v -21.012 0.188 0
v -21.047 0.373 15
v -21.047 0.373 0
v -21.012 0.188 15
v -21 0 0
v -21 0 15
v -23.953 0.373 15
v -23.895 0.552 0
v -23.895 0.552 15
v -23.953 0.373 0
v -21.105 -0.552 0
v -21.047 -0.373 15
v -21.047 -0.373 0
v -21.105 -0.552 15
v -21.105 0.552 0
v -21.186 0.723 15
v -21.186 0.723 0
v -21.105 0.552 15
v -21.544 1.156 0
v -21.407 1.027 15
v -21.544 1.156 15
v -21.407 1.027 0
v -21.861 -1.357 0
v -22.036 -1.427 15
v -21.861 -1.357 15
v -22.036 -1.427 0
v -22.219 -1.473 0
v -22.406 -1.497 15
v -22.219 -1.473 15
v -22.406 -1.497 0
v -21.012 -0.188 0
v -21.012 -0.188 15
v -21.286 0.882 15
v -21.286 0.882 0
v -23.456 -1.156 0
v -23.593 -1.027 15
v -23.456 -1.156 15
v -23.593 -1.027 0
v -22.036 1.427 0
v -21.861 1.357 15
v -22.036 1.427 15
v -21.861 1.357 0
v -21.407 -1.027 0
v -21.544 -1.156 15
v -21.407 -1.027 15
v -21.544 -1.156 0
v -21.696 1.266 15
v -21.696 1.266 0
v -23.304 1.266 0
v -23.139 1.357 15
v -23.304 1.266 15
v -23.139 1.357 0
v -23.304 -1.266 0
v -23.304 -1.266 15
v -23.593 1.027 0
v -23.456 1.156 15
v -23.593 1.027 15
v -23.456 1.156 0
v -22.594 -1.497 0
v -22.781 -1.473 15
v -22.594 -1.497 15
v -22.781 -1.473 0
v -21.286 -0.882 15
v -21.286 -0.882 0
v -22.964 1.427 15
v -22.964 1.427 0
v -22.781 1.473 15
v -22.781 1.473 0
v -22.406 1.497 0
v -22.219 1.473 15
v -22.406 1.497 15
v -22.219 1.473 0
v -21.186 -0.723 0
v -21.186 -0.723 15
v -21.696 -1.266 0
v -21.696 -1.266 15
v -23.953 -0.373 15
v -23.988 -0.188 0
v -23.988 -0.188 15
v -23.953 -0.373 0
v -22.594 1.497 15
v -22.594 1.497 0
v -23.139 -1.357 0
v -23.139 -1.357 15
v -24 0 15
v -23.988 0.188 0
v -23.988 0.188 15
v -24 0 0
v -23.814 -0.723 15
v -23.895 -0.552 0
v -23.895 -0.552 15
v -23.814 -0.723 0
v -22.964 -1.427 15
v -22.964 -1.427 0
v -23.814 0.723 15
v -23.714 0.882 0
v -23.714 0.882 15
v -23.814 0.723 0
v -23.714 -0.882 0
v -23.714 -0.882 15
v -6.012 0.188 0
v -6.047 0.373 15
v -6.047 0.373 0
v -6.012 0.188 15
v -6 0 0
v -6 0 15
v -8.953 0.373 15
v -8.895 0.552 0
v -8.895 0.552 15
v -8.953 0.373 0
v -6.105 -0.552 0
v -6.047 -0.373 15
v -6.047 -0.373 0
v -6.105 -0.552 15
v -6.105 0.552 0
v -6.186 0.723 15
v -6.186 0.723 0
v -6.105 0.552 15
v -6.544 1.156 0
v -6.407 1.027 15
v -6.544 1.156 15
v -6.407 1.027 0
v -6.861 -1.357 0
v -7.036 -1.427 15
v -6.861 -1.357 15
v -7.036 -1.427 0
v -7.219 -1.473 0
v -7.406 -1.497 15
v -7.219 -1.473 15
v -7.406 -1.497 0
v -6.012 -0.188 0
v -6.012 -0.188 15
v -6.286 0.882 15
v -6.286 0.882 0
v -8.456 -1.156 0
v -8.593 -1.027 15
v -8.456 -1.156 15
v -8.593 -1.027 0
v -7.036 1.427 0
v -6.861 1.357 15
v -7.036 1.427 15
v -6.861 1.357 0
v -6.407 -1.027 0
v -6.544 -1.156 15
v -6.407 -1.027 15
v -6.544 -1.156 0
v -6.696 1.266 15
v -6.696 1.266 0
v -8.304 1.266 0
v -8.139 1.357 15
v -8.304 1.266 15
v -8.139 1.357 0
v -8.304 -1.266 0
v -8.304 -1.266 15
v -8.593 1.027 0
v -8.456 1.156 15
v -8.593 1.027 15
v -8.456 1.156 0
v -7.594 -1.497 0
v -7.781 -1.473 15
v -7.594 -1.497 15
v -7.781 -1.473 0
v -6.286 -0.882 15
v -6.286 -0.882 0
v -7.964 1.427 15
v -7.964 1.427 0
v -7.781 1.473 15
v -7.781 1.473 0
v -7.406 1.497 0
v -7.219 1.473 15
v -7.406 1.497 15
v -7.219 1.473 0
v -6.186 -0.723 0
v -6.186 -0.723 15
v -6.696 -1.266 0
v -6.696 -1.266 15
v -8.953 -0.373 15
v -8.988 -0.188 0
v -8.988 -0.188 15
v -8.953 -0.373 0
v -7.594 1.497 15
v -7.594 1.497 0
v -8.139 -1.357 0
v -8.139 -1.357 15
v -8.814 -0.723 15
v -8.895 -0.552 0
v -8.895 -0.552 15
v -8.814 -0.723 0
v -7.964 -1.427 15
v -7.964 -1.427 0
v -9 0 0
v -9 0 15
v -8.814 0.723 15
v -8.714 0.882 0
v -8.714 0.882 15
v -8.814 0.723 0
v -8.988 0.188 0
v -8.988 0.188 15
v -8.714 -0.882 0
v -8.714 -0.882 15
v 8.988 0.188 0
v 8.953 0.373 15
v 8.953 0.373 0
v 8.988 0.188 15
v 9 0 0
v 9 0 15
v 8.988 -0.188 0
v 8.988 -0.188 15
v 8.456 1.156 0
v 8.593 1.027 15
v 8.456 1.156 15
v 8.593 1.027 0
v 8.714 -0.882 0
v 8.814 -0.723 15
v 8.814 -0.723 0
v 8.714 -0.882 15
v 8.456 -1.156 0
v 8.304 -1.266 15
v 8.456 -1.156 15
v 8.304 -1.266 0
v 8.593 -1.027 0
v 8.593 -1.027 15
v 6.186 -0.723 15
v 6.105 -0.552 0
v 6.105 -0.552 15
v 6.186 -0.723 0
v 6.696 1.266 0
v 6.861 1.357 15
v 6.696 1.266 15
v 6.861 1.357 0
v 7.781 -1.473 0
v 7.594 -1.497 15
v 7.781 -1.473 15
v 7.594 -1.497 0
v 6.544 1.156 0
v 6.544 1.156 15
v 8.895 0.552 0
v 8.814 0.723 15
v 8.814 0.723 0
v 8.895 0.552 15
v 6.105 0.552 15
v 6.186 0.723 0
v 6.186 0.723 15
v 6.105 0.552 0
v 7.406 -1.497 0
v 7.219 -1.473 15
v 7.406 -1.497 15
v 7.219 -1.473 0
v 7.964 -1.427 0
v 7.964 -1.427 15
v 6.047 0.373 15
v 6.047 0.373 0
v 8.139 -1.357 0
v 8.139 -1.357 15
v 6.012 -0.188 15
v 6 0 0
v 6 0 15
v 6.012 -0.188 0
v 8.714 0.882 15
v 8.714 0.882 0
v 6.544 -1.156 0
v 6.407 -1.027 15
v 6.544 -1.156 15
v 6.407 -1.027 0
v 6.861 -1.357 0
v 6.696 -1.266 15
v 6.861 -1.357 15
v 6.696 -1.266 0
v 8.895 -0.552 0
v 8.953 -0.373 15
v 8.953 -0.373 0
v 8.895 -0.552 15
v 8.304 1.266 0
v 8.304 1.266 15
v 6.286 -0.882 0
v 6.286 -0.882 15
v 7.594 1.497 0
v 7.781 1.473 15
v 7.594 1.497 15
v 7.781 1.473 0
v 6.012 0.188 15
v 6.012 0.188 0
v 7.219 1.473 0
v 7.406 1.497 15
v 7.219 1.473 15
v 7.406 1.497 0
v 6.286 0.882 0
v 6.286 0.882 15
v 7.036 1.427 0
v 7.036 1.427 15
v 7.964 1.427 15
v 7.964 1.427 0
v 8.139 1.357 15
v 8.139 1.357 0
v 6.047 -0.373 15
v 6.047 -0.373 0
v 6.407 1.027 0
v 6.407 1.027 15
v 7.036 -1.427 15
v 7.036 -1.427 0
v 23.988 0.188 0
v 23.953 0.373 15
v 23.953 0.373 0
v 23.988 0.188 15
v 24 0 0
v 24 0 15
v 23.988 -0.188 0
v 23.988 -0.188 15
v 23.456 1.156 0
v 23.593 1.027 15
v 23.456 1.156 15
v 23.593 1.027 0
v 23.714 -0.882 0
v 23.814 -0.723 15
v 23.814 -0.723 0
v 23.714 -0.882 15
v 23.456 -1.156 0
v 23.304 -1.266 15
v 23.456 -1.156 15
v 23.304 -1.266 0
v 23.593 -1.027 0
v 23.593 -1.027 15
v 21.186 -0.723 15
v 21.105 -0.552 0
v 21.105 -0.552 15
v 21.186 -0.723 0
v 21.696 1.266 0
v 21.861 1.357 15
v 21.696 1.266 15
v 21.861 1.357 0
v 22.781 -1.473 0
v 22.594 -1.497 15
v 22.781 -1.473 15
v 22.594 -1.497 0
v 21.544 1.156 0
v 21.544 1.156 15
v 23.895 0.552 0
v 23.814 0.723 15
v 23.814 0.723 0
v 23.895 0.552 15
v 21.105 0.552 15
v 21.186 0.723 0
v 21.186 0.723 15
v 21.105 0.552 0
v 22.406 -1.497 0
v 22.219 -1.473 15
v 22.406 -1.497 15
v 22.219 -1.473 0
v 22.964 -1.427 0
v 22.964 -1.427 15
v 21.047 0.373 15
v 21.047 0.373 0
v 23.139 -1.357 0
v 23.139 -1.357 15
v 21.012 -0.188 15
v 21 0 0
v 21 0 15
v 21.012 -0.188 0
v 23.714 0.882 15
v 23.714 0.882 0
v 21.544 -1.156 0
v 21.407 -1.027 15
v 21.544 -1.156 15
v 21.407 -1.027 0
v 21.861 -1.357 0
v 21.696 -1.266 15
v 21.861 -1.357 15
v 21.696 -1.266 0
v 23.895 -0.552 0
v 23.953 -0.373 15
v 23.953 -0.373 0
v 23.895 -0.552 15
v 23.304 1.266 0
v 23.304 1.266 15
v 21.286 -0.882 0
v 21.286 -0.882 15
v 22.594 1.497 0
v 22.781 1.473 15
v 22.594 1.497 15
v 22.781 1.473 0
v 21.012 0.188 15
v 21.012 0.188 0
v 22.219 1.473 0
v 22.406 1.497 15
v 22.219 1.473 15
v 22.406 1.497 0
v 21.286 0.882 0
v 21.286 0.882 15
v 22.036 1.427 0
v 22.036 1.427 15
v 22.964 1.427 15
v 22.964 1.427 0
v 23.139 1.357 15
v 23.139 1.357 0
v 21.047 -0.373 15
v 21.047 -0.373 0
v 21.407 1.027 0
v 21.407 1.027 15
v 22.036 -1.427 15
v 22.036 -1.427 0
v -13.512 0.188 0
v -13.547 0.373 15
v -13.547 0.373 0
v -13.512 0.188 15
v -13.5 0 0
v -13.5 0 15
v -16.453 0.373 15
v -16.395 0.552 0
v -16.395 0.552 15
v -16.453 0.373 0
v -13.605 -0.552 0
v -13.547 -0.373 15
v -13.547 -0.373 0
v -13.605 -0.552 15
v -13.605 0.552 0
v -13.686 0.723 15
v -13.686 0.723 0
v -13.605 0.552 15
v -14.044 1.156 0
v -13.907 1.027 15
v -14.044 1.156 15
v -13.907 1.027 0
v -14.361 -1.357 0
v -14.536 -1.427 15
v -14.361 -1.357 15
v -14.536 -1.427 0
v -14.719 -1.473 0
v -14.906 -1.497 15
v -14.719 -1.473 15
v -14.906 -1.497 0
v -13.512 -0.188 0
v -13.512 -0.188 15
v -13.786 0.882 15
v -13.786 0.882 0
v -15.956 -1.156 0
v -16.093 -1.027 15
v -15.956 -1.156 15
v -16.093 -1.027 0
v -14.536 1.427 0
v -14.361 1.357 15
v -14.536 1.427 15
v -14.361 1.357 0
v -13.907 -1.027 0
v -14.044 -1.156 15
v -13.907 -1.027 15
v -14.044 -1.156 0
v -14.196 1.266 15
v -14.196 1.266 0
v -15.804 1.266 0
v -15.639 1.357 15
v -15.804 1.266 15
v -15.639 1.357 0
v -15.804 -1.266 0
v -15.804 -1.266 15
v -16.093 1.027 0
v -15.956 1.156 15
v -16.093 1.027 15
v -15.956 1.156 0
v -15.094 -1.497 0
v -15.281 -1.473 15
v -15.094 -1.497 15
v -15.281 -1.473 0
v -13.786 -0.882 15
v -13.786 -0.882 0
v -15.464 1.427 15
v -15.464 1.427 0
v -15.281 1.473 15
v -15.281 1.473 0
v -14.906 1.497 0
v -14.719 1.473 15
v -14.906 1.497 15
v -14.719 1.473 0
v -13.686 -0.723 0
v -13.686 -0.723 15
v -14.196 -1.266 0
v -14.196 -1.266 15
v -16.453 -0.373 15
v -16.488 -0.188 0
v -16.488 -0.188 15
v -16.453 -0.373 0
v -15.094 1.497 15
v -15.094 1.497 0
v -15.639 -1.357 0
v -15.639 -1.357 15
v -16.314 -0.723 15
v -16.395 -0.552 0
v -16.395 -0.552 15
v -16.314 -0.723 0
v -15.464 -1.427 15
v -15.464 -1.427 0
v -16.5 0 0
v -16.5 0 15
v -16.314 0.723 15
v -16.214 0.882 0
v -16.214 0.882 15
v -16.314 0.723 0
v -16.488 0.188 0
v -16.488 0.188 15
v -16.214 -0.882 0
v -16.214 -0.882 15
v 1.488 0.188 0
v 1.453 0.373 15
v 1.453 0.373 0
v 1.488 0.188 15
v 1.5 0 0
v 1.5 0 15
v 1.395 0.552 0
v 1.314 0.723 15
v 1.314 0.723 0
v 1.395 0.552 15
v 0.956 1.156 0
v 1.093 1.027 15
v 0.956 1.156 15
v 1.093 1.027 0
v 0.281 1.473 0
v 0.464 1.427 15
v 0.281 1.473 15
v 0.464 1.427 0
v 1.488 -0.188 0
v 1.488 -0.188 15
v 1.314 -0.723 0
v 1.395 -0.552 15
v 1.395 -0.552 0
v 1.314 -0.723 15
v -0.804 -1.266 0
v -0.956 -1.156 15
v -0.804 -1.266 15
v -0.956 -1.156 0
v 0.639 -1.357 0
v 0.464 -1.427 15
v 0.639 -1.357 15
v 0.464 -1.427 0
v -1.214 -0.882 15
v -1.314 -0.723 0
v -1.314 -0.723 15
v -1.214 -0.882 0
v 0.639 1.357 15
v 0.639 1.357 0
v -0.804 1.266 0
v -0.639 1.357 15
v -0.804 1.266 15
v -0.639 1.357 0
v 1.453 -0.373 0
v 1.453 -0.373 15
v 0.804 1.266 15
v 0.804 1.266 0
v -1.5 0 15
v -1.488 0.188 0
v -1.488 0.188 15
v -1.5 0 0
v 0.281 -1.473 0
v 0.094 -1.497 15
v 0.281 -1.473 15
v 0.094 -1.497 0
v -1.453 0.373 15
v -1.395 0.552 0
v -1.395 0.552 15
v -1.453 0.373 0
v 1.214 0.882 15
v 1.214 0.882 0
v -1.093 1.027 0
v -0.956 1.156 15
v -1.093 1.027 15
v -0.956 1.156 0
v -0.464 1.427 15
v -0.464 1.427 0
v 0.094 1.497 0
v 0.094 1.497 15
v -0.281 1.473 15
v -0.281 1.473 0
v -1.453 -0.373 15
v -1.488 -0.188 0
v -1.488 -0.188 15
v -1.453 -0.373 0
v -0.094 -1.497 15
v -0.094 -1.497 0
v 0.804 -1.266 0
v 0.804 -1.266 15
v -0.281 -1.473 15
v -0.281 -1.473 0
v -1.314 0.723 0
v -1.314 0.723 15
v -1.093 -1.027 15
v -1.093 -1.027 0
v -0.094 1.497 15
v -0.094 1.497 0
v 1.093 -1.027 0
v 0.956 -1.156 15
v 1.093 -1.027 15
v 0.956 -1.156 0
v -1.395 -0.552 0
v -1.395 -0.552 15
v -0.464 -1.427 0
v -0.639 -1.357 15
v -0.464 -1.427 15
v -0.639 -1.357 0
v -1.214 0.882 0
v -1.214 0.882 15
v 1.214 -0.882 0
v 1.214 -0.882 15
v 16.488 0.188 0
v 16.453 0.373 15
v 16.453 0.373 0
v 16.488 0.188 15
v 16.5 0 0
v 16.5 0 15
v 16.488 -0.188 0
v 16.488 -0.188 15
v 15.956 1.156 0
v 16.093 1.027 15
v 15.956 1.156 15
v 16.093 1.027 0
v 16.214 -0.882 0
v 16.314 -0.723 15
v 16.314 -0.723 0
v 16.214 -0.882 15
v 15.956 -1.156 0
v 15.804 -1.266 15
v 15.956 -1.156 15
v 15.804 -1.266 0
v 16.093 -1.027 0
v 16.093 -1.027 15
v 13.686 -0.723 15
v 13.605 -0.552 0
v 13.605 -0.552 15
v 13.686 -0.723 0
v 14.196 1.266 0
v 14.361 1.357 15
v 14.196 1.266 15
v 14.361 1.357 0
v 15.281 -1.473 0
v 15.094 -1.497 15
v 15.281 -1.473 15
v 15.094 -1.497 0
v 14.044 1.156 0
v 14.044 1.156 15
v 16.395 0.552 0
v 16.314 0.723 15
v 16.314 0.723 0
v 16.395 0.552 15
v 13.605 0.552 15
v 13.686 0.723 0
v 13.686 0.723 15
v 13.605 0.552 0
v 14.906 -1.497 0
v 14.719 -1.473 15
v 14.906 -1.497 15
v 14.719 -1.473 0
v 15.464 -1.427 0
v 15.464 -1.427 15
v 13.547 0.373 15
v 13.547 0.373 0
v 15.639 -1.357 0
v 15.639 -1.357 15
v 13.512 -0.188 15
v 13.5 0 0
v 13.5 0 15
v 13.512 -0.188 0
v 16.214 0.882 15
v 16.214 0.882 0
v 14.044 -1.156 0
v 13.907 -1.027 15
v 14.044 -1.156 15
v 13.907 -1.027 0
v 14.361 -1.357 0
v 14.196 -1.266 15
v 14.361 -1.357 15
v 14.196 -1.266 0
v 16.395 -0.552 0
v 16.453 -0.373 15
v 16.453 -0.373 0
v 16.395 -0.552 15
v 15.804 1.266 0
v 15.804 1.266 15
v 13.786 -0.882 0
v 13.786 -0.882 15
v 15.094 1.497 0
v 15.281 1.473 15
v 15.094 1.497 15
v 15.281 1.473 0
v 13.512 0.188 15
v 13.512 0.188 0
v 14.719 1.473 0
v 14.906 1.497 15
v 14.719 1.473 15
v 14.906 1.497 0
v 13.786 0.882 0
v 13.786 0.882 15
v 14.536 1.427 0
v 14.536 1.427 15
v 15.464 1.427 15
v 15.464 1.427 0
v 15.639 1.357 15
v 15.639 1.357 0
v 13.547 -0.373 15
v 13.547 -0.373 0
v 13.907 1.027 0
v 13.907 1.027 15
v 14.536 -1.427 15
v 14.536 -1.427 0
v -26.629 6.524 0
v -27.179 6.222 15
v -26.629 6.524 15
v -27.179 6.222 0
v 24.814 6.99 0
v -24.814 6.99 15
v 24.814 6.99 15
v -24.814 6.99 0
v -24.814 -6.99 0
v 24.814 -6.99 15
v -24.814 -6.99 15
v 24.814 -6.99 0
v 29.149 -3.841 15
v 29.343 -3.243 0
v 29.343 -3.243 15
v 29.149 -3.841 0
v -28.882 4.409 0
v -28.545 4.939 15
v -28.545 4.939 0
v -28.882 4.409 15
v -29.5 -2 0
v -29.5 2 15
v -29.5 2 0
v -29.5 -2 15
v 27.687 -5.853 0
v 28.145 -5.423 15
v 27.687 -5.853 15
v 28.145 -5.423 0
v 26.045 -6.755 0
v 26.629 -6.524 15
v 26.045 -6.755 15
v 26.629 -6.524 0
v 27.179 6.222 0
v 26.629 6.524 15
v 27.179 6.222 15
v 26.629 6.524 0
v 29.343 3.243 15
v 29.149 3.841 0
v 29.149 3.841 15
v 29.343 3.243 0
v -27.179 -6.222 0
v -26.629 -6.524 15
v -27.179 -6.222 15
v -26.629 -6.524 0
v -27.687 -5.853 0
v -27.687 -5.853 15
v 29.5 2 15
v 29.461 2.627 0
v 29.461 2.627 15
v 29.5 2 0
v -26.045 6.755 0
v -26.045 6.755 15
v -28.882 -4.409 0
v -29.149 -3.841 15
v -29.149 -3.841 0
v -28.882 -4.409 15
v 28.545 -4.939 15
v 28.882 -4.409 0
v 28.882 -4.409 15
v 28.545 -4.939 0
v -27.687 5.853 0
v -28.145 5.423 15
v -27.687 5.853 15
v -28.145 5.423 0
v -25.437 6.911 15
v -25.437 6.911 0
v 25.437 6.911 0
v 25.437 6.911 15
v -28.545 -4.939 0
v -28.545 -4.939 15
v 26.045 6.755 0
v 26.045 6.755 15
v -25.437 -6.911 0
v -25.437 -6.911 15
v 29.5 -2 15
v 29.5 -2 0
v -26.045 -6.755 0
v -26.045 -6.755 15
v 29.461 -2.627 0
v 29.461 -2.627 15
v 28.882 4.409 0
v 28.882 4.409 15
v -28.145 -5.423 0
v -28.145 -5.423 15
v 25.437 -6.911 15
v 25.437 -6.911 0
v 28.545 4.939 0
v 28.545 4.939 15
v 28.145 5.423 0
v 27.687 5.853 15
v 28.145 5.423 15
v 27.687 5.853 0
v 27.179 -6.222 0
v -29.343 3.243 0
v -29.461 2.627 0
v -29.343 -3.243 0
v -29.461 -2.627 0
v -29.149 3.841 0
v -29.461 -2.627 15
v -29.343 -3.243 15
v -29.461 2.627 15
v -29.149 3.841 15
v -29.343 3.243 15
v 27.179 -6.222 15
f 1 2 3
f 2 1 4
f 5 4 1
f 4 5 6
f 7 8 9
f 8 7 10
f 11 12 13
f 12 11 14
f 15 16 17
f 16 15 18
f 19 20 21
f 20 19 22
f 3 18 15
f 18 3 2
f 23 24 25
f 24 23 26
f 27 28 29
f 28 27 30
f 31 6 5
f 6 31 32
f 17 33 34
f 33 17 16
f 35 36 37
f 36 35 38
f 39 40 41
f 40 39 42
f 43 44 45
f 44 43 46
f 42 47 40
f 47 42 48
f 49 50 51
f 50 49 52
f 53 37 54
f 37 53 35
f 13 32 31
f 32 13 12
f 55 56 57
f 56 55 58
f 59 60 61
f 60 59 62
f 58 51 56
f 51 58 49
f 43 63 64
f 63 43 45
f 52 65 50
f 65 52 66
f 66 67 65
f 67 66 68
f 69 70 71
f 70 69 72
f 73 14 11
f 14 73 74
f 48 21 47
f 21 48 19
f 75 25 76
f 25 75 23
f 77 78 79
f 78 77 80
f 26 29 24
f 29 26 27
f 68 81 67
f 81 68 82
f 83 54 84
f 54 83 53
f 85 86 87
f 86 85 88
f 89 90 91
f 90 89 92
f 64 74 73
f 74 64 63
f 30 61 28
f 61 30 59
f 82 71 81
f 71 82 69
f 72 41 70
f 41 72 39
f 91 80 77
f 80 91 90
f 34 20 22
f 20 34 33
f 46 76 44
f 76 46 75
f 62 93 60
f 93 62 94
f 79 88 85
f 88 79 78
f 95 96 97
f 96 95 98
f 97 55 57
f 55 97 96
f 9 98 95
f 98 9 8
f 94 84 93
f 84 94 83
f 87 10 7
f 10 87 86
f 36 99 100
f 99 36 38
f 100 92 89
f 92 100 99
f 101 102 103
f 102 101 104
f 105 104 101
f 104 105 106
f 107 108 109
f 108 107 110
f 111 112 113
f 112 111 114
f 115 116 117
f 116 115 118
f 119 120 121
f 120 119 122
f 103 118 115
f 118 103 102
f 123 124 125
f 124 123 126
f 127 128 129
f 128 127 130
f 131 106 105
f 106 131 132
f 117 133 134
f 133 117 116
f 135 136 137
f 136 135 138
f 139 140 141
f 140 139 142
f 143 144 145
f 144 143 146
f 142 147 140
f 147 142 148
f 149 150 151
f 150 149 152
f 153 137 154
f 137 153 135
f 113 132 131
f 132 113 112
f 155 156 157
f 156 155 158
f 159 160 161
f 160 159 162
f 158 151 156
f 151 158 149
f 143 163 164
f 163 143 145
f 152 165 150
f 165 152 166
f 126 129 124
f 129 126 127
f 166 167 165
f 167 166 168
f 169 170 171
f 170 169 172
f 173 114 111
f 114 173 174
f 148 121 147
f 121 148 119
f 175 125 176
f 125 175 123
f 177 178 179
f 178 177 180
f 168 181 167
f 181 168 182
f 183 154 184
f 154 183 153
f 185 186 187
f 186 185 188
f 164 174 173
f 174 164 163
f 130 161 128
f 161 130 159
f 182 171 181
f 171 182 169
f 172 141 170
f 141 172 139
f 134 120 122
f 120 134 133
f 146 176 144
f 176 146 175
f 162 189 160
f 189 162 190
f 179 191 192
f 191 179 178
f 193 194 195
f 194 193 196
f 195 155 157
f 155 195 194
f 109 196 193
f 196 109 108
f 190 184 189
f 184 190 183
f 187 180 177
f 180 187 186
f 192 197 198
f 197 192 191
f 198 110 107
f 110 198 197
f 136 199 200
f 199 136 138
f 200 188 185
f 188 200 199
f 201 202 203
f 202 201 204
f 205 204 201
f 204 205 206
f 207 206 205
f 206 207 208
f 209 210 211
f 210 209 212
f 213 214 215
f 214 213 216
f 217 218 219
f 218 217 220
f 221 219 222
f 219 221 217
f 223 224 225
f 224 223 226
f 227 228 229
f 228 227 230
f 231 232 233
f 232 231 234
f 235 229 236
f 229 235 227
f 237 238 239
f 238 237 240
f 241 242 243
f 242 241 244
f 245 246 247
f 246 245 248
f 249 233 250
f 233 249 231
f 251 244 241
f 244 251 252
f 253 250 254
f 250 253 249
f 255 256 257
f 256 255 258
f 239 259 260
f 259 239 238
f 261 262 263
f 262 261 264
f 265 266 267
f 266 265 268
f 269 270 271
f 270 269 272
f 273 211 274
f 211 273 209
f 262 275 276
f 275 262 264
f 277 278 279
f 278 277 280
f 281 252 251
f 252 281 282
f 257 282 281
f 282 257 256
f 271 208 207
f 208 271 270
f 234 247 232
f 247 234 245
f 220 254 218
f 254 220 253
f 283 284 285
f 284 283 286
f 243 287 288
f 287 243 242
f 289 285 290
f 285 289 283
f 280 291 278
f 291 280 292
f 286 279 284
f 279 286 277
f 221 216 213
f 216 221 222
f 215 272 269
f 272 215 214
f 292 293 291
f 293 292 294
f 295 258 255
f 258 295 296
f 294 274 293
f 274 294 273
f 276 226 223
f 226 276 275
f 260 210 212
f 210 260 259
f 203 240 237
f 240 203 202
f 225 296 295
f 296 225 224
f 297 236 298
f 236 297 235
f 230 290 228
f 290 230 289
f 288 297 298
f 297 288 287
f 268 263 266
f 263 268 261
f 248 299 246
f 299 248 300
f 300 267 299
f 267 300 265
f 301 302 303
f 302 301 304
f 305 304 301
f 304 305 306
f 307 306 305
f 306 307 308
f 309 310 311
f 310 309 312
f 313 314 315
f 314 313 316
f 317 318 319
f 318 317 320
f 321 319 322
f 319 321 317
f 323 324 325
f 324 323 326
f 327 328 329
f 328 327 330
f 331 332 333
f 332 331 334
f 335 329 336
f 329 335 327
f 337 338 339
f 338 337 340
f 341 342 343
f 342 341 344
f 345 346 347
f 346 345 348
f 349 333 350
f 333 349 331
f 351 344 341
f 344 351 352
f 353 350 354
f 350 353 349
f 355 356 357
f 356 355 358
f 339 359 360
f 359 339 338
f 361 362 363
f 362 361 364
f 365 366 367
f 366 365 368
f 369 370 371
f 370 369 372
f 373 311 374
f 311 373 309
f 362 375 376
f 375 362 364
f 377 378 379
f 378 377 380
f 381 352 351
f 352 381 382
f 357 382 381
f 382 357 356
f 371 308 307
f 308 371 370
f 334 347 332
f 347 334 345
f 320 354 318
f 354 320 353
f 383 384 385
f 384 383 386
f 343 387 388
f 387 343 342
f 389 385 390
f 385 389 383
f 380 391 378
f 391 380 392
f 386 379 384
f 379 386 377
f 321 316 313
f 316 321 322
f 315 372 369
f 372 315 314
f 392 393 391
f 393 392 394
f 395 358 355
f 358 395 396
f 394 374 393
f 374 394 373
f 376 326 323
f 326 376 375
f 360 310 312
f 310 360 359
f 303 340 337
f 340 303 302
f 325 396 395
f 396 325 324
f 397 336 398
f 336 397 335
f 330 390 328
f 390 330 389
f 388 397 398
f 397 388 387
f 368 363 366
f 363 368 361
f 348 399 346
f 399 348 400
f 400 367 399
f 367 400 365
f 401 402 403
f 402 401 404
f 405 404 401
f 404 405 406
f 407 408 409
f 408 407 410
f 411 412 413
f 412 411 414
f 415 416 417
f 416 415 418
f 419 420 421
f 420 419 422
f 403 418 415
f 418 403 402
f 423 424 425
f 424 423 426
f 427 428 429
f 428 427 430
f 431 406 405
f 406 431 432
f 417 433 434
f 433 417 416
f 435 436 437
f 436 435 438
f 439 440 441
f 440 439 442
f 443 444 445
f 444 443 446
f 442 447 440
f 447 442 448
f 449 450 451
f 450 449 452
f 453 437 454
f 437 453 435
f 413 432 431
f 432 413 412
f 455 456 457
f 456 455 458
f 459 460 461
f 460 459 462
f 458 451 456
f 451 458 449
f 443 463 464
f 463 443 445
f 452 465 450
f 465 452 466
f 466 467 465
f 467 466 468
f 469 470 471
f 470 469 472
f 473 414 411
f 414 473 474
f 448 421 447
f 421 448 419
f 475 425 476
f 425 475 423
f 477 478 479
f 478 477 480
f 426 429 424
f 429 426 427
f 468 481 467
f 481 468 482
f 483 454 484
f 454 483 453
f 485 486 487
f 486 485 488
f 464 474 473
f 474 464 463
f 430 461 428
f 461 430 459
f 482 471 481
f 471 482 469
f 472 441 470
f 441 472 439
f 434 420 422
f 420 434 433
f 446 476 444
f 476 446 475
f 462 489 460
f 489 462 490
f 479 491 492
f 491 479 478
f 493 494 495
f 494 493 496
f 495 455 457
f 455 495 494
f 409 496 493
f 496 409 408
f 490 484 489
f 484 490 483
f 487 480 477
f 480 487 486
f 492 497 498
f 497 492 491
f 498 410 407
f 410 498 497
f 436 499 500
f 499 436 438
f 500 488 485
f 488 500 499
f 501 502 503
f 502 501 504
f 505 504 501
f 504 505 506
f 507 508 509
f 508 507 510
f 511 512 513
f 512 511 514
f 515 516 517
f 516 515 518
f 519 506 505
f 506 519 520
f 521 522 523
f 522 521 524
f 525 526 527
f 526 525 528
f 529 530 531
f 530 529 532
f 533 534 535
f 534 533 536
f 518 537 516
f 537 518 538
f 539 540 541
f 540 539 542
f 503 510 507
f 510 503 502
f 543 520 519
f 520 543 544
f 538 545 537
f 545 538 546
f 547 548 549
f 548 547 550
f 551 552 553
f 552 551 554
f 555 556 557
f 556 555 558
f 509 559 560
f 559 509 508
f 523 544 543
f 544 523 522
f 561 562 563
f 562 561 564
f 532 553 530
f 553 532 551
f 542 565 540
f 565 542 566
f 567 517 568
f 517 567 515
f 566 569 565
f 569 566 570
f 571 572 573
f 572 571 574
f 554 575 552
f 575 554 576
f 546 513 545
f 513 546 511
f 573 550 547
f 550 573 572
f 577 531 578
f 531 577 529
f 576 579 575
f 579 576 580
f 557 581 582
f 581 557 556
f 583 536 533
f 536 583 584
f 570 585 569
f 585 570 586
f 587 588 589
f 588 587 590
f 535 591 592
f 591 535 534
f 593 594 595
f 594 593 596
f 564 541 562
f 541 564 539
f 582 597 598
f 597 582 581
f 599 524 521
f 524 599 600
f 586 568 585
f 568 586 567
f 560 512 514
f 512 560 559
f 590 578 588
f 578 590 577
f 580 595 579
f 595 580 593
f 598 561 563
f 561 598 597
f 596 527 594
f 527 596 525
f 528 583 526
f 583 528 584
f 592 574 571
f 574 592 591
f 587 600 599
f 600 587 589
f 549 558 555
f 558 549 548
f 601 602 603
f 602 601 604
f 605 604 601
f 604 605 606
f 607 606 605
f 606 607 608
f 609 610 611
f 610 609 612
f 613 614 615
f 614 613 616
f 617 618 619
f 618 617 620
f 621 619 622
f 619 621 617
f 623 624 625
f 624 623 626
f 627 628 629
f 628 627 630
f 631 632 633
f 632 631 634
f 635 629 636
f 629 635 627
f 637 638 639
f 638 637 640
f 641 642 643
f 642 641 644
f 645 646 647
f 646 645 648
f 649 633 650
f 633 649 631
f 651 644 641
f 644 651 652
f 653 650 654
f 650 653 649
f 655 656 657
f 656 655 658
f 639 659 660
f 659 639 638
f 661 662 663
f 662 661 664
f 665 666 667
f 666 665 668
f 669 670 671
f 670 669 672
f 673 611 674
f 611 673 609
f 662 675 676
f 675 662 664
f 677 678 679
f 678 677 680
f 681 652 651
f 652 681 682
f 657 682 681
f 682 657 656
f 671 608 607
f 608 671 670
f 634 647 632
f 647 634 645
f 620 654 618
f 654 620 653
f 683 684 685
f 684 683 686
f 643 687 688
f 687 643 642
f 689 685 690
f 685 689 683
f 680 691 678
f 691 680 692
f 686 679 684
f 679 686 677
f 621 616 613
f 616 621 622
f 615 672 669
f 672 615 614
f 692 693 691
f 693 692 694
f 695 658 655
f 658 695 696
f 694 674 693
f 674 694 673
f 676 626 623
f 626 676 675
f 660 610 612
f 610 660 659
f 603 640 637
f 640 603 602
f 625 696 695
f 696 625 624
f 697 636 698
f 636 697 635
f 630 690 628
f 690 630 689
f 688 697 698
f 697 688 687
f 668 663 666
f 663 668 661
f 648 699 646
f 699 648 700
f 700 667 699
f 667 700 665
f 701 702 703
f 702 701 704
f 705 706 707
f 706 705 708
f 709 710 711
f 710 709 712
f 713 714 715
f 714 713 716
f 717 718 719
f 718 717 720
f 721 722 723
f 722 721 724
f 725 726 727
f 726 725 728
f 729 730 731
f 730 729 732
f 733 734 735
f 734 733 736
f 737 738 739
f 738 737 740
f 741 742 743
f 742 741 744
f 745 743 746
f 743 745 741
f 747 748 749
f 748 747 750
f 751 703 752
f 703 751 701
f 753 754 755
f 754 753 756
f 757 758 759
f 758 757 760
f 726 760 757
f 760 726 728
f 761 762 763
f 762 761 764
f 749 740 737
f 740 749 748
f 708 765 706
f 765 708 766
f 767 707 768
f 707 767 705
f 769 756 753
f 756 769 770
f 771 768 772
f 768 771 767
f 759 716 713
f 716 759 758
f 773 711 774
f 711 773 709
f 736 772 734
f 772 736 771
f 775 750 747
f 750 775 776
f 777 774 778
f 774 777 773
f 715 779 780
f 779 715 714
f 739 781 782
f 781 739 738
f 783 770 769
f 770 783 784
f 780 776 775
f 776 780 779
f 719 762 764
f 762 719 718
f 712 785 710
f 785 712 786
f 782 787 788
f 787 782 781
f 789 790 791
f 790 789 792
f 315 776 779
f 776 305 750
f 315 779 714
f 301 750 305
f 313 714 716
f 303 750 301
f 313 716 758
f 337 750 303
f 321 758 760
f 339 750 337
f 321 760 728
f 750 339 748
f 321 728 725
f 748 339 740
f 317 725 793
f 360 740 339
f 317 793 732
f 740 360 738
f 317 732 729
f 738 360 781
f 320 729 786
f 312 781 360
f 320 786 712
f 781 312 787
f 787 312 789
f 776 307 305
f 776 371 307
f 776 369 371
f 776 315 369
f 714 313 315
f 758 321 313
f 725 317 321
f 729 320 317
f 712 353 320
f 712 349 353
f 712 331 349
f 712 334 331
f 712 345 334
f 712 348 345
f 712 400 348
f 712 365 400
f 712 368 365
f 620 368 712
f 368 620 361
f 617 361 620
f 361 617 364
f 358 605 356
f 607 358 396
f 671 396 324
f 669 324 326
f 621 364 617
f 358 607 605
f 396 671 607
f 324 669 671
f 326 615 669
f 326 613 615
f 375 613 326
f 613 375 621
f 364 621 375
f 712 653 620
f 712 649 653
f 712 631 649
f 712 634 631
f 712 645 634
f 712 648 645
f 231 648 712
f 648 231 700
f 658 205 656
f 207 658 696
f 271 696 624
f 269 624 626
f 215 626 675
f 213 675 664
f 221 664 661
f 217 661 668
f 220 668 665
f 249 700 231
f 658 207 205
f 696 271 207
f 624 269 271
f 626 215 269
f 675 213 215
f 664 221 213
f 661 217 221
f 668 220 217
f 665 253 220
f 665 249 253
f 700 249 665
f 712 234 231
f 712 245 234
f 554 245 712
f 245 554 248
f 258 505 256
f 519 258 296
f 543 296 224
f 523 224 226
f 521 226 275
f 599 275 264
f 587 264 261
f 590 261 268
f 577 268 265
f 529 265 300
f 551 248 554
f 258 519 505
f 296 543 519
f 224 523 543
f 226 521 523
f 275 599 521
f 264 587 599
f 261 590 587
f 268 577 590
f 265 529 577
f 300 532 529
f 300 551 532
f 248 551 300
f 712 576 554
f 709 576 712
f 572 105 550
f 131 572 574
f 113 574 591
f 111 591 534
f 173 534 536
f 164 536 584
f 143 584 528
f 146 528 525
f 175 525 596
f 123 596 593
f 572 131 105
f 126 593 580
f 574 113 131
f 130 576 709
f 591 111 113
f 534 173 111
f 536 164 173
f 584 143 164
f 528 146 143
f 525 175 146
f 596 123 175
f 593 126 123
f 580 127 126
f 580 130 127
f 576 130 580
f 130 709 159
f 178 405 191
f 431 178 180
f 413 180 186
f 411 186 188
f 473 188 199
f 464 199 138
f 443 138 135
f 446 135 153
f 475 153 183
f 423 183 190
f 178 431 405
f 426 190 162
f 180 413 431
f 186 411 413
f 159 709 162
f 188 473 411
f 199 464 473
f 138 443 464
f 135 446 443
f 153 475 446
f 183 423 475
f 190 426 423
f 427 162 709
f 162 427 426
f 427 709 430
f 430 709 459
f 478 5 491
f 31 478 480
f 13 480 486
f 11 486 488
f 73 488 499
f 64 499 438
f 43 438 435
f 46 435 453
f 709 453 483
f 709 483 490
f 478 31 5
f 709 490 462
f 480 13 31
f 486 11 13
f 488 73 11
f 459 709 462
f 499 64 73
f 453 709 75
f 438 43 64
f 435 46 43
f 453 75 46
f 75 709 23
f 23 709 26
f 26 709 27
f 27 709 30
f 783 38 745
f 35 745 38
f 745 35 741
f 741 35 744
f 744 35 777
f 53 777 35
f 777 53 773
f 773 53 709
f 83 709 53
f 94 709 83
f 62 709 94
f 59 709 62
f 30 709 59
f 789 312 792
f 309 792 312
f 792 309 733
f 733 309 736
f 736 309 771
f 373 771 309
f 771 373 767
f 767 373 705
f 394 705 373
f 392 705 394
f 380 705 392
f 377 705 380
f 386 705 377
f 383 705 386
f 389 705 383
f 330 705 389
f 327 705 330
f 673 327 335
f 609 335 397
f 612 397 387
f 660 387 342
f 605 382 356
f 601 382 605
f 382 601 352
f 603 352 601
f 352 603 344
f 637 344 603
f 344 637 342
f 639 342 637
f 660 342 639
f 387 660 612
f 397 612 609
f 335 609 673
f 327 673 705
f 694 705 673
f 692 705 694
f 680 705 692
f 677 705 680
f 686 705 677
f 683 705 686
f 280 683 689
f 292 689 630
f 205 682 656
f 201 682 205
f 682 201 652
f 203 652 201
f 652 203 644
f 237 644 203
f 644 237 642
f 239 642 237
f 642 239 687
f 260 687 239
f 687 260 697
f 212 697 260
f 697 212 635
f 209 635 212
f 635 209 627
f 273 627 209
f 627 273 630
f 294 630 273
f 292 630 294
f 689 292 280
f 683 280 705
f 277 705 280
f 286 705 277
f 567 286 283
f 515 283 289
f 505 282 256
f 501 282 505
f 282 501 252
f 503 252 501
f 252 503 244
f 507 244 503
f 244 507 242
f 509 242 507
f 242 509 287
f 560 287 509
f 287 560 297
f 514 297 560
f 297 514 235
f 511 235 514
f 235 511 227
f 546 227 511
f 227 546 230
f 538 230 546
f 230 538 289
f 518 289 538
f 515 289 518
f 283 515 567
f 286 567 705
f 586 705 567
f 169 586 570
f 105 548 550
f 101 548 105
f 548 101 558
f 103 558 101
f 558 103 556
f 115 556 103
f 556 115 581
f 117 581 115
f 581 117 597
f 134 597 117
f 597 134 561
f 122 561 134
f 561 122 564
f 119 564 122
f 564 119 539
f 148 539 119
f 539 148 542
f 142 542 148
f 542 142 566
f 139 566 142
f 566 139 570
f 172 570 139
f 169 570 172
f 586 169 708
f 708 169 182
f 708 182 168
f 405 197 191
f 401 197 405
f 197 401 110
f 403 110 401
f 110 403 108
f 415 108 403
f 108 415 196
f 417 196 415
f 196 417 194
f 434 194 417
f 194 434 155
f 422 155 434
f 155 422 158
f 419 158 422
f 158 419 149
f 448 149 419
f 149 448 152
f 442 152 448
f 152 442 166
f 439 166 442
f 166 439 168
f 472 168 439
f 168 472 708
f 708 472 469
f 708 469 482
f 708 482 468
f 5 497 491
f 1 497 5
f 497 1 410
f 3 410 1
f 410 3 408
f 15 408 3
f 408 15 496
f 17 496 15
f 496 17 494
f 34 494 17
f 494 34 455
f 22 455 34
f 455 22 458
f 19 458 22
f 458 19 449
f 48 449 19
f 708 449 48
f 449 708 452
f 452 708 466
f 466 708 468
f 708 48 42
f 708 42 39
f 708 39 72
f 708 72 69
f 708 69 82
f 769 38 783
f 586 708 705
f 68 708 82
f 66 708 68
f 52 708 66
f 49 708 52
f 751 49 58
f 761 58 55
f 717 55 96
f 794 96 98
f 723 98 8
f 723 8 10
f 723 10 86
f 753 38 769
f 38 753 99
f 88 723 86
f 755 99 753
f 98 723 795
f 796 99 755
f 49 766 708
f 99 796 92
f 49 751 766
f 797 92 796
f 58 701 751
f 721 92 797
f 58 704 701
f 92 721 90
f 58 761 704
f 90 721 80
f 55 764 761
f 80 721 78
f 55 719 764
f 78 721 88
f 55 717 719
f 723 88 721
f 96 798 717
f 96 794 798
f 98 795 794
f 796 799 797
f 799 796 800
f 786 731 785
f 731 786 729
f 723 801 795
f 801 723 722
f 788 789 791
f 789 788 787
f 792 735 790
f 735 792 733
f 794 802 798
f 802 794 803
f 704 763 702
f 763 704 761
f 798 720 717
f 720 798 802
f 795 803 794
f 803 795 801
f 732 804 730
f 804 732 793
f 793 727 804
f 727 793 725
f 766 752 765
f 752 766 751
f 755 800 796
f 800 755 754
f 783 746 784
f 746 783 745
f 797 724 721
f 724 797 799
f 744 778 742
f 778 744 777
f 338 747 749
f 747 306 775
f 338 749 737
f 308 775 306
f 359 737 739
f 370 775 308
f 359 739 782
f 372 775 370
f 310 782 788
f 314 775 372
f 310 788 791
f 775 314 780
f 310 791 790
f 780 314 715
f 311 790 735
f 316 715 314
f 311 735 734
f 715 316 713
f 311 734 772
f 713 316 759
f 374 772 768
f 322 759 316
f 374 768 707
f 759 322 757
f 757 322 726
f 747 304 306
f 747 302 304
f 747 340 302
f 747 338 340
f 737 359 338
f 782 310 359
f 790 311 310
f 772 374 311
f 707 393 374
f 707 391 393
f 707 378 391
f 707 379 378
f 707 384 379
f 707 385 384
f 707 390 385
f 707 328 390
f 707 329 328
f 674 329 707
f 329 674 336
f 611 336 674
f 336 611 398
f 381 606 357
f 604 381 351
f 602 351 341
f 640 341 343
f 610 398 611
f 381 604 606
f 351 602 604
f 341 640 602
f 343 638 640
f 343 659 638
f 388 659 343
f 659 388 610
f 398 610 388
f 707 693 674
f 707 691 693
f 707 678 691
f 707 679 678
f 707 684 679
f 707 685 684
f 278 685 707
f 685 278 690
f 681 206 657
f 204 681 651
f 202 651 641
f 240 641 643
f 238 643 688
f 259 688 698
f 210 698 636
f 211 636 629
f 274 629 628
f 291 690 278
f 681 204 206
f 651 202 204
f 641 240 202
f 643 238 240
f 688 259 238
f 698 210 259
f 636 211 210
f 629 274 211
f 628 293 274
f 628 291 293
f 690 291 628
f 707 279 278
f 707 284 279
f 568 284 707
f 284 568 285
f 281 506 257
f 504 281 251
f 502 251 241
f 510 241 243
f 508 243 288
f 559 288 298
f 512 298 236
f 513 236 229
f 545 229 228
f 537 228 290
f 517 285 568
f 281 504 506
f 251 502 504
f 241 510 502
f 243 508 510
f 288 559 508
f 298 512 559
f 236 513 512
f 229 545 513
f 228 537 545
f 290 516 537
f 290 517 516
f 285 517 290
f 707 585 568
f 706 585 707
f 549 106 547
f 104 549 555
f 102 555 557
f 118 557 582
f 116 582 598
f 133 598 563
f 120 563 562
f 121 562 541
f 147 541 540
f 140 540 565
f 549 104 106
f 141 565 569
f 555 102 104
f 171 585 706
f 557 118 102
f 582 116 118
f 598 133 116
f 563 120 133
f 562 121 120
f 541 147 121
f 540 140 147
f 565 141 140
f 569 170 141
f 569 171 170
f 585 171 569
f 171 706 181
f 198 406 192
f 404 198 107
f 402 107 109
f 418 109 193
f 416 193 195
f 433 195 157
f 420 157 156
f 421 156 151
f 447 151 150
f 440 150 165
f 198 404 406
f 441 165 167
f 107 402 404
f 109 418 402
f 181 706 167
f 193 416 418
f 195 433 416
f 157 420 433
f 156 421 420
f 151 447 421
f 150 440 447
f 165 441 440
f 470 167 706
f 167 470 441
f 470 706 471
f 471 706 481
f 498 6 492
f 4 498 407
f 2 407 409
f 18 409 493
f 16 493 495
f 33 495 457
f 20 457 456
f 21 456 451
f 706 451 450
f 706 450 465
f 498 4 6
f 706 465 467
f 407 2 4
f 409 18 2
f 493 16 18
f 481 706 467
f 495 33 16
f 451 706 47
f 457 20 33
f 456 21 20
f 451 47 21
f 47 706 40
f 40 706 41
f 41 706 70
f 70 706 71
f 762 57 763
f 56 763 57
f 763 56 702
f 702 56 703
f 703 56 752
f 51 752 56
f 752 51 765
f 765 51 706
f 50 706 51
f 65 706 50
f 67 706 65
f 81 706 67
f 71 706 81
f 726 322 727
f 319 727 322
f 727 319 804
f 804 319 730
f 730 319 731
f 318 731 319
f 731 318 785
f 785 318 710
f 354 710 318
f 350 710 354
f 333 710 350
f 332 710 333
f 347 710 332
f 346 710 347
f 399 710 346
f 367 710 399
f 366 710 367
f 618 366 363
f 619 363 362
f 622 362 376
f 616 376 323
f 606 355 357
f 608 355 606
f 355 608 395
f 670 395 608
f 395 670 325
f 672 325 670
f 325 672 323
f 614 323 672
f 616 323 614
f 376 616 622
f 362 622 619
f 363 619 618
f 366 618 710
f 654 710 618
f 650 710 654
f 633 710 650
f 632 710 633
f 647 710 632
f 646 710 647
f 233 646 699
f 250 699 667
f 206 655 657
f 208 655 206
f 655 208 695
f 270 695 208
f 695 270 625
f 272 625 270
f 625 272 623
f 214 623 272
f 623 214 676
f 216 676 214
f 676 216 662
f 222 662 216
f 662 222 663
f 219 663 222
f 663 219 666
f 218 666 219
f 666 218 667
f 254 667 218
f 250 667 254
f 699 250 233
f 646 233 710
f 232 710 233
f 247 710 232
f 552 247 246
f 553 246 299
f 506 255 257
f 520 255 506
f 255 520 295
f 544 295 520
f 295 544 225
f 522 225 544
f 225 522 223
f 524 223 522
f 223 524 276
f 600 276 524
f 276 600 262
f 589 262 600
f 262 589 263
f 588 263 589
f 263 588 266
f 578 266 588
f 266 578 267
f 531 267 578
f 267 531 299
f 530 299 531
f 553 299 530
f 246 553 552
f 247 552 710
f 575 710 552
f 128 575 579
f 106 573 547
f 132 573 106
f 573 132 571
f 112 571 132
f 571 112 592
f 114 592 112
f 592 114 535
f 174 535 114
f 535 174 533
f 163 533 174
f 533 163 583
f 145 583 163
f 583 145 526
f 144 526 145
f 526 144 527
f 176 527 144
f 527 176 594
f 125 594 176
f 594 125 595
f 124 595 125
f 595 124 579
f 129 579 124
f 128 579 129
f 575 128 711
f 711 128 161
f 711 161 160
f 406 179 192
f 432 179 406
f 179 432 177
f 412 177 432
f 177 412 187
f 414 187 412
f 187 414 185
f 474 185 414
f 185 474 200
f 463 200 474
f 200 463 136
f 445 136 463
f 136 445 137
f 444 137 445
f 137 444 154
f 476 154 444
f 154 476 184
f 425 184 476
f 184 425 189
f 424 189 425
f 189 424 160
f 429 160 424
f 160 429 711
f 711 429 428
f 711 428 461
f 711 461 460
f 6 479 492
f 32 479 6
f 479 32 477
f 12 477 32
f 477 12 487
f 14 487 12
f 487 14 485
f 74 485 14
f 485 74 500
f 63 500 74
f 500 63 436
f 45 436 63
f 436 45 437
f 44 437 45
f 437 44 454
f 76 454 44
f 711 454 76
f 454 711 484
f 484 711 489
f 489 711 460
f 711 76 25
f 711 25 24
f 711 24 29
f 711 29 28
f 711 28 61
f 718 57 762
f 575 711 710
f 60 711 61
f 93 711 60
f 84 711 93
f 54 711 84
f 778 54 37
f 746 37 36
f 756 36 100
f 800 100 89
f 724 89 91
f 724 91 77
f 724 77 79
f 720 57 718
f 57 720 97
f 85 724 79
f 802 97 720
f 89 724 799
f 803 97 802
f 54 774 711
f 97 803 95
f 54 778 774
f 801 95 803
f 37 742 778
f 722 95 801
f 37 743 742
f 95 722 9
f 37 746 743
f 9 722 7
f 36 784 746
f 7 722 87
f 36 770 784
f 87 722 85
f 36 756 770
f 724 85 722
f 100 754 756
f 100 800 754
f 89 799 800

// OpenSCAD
$fn = 50;


difference() {
	union() {
		hull() {
			translate(v = [-24.5000000000, 2.0000000000, 0]) {
				cylinder(h = 15, r = 5);
			}
			translate(v = [24.5000000000, 2.0000000000, 0]) {
				cylinder(h = 15, r = 5);
			}
			translate(v = [-24.5000000000, -2.0000000000, 0]) {
				cylinder(h = 15, r = 5);
			}
			translate(v = [24.5000000000, -2.0000000000, 0]) {
				cylinder(h = 15, r = 5);
			}
		}
	}
	union() {
		translate(v = [-22.5000000000, 0.0000000000, 0]) {
			translate(v = [0, 0, -100]) {
				cylinder(h = 200, r = 1.5000000000);
			}
		}
		translate(v = [-7.5000000000, 0.0000000000, 0]) {
			translate(v = [0, 0, -100]) {
				cylinder(h = 200, r = 1.5000000000);
			}
		}
		translate(v = [7.5000000000, 0.0000000000, 0]) {
			translate(v = [0, 0, -100]) {
				cylinder(h = 200, r = 1.5000000000);
			}
		}
		translate(v = [22.5000000000, 0.0000000000, 0]) {
			translate(v = [0, 0, -100]) {
				cylinder(h = 200, r = 1.5000000000);
			}
		}
		translate(v = [-22.5000000000, 0.0000000000, 0]) {
			translate(v = [0, 0, -100]) {
				cylinder(h = 200, r = 1.5000000000);
			}
		}
		translate(v = [-15.0000000000, 0.0000000000, 0]) {
			translate(v = [0, 0, -100]) {
				cylinder(h = 200, r = 1.5000000000);
			}
		}
		translate(v = [-7.5000000000, 0.0000000000, 0]) {
			translate(v = [0, 0, -100]) {
				cylinder(h = 200, r = 1.5000000000);
			}
		}
		translate(v = [0, 0, -100]) {
			cylinder(h = 200, r = 1.5000000000);
		}
		translate(v = [7.5000000000, 0.0000000000, 0]) {
			translate(v = [0, 0, -100]) {
				cylinder(h = 200, r = 1.5000000000);
			}
		}
		translate(v = [15.0000000000, 0.0000000000, 0]) {
			translate(v = [0, 0, -100]) {
				cylinder(h = 200, r = 1.5000000000);
			}
		}
		translate(v = [22.5000000000, 0.0000000000, 0]) {
			translate(v = [0, 0, -100]) {
				cylinder(h = 200, r = 1.5000000000);
			}
		}
	}
}
